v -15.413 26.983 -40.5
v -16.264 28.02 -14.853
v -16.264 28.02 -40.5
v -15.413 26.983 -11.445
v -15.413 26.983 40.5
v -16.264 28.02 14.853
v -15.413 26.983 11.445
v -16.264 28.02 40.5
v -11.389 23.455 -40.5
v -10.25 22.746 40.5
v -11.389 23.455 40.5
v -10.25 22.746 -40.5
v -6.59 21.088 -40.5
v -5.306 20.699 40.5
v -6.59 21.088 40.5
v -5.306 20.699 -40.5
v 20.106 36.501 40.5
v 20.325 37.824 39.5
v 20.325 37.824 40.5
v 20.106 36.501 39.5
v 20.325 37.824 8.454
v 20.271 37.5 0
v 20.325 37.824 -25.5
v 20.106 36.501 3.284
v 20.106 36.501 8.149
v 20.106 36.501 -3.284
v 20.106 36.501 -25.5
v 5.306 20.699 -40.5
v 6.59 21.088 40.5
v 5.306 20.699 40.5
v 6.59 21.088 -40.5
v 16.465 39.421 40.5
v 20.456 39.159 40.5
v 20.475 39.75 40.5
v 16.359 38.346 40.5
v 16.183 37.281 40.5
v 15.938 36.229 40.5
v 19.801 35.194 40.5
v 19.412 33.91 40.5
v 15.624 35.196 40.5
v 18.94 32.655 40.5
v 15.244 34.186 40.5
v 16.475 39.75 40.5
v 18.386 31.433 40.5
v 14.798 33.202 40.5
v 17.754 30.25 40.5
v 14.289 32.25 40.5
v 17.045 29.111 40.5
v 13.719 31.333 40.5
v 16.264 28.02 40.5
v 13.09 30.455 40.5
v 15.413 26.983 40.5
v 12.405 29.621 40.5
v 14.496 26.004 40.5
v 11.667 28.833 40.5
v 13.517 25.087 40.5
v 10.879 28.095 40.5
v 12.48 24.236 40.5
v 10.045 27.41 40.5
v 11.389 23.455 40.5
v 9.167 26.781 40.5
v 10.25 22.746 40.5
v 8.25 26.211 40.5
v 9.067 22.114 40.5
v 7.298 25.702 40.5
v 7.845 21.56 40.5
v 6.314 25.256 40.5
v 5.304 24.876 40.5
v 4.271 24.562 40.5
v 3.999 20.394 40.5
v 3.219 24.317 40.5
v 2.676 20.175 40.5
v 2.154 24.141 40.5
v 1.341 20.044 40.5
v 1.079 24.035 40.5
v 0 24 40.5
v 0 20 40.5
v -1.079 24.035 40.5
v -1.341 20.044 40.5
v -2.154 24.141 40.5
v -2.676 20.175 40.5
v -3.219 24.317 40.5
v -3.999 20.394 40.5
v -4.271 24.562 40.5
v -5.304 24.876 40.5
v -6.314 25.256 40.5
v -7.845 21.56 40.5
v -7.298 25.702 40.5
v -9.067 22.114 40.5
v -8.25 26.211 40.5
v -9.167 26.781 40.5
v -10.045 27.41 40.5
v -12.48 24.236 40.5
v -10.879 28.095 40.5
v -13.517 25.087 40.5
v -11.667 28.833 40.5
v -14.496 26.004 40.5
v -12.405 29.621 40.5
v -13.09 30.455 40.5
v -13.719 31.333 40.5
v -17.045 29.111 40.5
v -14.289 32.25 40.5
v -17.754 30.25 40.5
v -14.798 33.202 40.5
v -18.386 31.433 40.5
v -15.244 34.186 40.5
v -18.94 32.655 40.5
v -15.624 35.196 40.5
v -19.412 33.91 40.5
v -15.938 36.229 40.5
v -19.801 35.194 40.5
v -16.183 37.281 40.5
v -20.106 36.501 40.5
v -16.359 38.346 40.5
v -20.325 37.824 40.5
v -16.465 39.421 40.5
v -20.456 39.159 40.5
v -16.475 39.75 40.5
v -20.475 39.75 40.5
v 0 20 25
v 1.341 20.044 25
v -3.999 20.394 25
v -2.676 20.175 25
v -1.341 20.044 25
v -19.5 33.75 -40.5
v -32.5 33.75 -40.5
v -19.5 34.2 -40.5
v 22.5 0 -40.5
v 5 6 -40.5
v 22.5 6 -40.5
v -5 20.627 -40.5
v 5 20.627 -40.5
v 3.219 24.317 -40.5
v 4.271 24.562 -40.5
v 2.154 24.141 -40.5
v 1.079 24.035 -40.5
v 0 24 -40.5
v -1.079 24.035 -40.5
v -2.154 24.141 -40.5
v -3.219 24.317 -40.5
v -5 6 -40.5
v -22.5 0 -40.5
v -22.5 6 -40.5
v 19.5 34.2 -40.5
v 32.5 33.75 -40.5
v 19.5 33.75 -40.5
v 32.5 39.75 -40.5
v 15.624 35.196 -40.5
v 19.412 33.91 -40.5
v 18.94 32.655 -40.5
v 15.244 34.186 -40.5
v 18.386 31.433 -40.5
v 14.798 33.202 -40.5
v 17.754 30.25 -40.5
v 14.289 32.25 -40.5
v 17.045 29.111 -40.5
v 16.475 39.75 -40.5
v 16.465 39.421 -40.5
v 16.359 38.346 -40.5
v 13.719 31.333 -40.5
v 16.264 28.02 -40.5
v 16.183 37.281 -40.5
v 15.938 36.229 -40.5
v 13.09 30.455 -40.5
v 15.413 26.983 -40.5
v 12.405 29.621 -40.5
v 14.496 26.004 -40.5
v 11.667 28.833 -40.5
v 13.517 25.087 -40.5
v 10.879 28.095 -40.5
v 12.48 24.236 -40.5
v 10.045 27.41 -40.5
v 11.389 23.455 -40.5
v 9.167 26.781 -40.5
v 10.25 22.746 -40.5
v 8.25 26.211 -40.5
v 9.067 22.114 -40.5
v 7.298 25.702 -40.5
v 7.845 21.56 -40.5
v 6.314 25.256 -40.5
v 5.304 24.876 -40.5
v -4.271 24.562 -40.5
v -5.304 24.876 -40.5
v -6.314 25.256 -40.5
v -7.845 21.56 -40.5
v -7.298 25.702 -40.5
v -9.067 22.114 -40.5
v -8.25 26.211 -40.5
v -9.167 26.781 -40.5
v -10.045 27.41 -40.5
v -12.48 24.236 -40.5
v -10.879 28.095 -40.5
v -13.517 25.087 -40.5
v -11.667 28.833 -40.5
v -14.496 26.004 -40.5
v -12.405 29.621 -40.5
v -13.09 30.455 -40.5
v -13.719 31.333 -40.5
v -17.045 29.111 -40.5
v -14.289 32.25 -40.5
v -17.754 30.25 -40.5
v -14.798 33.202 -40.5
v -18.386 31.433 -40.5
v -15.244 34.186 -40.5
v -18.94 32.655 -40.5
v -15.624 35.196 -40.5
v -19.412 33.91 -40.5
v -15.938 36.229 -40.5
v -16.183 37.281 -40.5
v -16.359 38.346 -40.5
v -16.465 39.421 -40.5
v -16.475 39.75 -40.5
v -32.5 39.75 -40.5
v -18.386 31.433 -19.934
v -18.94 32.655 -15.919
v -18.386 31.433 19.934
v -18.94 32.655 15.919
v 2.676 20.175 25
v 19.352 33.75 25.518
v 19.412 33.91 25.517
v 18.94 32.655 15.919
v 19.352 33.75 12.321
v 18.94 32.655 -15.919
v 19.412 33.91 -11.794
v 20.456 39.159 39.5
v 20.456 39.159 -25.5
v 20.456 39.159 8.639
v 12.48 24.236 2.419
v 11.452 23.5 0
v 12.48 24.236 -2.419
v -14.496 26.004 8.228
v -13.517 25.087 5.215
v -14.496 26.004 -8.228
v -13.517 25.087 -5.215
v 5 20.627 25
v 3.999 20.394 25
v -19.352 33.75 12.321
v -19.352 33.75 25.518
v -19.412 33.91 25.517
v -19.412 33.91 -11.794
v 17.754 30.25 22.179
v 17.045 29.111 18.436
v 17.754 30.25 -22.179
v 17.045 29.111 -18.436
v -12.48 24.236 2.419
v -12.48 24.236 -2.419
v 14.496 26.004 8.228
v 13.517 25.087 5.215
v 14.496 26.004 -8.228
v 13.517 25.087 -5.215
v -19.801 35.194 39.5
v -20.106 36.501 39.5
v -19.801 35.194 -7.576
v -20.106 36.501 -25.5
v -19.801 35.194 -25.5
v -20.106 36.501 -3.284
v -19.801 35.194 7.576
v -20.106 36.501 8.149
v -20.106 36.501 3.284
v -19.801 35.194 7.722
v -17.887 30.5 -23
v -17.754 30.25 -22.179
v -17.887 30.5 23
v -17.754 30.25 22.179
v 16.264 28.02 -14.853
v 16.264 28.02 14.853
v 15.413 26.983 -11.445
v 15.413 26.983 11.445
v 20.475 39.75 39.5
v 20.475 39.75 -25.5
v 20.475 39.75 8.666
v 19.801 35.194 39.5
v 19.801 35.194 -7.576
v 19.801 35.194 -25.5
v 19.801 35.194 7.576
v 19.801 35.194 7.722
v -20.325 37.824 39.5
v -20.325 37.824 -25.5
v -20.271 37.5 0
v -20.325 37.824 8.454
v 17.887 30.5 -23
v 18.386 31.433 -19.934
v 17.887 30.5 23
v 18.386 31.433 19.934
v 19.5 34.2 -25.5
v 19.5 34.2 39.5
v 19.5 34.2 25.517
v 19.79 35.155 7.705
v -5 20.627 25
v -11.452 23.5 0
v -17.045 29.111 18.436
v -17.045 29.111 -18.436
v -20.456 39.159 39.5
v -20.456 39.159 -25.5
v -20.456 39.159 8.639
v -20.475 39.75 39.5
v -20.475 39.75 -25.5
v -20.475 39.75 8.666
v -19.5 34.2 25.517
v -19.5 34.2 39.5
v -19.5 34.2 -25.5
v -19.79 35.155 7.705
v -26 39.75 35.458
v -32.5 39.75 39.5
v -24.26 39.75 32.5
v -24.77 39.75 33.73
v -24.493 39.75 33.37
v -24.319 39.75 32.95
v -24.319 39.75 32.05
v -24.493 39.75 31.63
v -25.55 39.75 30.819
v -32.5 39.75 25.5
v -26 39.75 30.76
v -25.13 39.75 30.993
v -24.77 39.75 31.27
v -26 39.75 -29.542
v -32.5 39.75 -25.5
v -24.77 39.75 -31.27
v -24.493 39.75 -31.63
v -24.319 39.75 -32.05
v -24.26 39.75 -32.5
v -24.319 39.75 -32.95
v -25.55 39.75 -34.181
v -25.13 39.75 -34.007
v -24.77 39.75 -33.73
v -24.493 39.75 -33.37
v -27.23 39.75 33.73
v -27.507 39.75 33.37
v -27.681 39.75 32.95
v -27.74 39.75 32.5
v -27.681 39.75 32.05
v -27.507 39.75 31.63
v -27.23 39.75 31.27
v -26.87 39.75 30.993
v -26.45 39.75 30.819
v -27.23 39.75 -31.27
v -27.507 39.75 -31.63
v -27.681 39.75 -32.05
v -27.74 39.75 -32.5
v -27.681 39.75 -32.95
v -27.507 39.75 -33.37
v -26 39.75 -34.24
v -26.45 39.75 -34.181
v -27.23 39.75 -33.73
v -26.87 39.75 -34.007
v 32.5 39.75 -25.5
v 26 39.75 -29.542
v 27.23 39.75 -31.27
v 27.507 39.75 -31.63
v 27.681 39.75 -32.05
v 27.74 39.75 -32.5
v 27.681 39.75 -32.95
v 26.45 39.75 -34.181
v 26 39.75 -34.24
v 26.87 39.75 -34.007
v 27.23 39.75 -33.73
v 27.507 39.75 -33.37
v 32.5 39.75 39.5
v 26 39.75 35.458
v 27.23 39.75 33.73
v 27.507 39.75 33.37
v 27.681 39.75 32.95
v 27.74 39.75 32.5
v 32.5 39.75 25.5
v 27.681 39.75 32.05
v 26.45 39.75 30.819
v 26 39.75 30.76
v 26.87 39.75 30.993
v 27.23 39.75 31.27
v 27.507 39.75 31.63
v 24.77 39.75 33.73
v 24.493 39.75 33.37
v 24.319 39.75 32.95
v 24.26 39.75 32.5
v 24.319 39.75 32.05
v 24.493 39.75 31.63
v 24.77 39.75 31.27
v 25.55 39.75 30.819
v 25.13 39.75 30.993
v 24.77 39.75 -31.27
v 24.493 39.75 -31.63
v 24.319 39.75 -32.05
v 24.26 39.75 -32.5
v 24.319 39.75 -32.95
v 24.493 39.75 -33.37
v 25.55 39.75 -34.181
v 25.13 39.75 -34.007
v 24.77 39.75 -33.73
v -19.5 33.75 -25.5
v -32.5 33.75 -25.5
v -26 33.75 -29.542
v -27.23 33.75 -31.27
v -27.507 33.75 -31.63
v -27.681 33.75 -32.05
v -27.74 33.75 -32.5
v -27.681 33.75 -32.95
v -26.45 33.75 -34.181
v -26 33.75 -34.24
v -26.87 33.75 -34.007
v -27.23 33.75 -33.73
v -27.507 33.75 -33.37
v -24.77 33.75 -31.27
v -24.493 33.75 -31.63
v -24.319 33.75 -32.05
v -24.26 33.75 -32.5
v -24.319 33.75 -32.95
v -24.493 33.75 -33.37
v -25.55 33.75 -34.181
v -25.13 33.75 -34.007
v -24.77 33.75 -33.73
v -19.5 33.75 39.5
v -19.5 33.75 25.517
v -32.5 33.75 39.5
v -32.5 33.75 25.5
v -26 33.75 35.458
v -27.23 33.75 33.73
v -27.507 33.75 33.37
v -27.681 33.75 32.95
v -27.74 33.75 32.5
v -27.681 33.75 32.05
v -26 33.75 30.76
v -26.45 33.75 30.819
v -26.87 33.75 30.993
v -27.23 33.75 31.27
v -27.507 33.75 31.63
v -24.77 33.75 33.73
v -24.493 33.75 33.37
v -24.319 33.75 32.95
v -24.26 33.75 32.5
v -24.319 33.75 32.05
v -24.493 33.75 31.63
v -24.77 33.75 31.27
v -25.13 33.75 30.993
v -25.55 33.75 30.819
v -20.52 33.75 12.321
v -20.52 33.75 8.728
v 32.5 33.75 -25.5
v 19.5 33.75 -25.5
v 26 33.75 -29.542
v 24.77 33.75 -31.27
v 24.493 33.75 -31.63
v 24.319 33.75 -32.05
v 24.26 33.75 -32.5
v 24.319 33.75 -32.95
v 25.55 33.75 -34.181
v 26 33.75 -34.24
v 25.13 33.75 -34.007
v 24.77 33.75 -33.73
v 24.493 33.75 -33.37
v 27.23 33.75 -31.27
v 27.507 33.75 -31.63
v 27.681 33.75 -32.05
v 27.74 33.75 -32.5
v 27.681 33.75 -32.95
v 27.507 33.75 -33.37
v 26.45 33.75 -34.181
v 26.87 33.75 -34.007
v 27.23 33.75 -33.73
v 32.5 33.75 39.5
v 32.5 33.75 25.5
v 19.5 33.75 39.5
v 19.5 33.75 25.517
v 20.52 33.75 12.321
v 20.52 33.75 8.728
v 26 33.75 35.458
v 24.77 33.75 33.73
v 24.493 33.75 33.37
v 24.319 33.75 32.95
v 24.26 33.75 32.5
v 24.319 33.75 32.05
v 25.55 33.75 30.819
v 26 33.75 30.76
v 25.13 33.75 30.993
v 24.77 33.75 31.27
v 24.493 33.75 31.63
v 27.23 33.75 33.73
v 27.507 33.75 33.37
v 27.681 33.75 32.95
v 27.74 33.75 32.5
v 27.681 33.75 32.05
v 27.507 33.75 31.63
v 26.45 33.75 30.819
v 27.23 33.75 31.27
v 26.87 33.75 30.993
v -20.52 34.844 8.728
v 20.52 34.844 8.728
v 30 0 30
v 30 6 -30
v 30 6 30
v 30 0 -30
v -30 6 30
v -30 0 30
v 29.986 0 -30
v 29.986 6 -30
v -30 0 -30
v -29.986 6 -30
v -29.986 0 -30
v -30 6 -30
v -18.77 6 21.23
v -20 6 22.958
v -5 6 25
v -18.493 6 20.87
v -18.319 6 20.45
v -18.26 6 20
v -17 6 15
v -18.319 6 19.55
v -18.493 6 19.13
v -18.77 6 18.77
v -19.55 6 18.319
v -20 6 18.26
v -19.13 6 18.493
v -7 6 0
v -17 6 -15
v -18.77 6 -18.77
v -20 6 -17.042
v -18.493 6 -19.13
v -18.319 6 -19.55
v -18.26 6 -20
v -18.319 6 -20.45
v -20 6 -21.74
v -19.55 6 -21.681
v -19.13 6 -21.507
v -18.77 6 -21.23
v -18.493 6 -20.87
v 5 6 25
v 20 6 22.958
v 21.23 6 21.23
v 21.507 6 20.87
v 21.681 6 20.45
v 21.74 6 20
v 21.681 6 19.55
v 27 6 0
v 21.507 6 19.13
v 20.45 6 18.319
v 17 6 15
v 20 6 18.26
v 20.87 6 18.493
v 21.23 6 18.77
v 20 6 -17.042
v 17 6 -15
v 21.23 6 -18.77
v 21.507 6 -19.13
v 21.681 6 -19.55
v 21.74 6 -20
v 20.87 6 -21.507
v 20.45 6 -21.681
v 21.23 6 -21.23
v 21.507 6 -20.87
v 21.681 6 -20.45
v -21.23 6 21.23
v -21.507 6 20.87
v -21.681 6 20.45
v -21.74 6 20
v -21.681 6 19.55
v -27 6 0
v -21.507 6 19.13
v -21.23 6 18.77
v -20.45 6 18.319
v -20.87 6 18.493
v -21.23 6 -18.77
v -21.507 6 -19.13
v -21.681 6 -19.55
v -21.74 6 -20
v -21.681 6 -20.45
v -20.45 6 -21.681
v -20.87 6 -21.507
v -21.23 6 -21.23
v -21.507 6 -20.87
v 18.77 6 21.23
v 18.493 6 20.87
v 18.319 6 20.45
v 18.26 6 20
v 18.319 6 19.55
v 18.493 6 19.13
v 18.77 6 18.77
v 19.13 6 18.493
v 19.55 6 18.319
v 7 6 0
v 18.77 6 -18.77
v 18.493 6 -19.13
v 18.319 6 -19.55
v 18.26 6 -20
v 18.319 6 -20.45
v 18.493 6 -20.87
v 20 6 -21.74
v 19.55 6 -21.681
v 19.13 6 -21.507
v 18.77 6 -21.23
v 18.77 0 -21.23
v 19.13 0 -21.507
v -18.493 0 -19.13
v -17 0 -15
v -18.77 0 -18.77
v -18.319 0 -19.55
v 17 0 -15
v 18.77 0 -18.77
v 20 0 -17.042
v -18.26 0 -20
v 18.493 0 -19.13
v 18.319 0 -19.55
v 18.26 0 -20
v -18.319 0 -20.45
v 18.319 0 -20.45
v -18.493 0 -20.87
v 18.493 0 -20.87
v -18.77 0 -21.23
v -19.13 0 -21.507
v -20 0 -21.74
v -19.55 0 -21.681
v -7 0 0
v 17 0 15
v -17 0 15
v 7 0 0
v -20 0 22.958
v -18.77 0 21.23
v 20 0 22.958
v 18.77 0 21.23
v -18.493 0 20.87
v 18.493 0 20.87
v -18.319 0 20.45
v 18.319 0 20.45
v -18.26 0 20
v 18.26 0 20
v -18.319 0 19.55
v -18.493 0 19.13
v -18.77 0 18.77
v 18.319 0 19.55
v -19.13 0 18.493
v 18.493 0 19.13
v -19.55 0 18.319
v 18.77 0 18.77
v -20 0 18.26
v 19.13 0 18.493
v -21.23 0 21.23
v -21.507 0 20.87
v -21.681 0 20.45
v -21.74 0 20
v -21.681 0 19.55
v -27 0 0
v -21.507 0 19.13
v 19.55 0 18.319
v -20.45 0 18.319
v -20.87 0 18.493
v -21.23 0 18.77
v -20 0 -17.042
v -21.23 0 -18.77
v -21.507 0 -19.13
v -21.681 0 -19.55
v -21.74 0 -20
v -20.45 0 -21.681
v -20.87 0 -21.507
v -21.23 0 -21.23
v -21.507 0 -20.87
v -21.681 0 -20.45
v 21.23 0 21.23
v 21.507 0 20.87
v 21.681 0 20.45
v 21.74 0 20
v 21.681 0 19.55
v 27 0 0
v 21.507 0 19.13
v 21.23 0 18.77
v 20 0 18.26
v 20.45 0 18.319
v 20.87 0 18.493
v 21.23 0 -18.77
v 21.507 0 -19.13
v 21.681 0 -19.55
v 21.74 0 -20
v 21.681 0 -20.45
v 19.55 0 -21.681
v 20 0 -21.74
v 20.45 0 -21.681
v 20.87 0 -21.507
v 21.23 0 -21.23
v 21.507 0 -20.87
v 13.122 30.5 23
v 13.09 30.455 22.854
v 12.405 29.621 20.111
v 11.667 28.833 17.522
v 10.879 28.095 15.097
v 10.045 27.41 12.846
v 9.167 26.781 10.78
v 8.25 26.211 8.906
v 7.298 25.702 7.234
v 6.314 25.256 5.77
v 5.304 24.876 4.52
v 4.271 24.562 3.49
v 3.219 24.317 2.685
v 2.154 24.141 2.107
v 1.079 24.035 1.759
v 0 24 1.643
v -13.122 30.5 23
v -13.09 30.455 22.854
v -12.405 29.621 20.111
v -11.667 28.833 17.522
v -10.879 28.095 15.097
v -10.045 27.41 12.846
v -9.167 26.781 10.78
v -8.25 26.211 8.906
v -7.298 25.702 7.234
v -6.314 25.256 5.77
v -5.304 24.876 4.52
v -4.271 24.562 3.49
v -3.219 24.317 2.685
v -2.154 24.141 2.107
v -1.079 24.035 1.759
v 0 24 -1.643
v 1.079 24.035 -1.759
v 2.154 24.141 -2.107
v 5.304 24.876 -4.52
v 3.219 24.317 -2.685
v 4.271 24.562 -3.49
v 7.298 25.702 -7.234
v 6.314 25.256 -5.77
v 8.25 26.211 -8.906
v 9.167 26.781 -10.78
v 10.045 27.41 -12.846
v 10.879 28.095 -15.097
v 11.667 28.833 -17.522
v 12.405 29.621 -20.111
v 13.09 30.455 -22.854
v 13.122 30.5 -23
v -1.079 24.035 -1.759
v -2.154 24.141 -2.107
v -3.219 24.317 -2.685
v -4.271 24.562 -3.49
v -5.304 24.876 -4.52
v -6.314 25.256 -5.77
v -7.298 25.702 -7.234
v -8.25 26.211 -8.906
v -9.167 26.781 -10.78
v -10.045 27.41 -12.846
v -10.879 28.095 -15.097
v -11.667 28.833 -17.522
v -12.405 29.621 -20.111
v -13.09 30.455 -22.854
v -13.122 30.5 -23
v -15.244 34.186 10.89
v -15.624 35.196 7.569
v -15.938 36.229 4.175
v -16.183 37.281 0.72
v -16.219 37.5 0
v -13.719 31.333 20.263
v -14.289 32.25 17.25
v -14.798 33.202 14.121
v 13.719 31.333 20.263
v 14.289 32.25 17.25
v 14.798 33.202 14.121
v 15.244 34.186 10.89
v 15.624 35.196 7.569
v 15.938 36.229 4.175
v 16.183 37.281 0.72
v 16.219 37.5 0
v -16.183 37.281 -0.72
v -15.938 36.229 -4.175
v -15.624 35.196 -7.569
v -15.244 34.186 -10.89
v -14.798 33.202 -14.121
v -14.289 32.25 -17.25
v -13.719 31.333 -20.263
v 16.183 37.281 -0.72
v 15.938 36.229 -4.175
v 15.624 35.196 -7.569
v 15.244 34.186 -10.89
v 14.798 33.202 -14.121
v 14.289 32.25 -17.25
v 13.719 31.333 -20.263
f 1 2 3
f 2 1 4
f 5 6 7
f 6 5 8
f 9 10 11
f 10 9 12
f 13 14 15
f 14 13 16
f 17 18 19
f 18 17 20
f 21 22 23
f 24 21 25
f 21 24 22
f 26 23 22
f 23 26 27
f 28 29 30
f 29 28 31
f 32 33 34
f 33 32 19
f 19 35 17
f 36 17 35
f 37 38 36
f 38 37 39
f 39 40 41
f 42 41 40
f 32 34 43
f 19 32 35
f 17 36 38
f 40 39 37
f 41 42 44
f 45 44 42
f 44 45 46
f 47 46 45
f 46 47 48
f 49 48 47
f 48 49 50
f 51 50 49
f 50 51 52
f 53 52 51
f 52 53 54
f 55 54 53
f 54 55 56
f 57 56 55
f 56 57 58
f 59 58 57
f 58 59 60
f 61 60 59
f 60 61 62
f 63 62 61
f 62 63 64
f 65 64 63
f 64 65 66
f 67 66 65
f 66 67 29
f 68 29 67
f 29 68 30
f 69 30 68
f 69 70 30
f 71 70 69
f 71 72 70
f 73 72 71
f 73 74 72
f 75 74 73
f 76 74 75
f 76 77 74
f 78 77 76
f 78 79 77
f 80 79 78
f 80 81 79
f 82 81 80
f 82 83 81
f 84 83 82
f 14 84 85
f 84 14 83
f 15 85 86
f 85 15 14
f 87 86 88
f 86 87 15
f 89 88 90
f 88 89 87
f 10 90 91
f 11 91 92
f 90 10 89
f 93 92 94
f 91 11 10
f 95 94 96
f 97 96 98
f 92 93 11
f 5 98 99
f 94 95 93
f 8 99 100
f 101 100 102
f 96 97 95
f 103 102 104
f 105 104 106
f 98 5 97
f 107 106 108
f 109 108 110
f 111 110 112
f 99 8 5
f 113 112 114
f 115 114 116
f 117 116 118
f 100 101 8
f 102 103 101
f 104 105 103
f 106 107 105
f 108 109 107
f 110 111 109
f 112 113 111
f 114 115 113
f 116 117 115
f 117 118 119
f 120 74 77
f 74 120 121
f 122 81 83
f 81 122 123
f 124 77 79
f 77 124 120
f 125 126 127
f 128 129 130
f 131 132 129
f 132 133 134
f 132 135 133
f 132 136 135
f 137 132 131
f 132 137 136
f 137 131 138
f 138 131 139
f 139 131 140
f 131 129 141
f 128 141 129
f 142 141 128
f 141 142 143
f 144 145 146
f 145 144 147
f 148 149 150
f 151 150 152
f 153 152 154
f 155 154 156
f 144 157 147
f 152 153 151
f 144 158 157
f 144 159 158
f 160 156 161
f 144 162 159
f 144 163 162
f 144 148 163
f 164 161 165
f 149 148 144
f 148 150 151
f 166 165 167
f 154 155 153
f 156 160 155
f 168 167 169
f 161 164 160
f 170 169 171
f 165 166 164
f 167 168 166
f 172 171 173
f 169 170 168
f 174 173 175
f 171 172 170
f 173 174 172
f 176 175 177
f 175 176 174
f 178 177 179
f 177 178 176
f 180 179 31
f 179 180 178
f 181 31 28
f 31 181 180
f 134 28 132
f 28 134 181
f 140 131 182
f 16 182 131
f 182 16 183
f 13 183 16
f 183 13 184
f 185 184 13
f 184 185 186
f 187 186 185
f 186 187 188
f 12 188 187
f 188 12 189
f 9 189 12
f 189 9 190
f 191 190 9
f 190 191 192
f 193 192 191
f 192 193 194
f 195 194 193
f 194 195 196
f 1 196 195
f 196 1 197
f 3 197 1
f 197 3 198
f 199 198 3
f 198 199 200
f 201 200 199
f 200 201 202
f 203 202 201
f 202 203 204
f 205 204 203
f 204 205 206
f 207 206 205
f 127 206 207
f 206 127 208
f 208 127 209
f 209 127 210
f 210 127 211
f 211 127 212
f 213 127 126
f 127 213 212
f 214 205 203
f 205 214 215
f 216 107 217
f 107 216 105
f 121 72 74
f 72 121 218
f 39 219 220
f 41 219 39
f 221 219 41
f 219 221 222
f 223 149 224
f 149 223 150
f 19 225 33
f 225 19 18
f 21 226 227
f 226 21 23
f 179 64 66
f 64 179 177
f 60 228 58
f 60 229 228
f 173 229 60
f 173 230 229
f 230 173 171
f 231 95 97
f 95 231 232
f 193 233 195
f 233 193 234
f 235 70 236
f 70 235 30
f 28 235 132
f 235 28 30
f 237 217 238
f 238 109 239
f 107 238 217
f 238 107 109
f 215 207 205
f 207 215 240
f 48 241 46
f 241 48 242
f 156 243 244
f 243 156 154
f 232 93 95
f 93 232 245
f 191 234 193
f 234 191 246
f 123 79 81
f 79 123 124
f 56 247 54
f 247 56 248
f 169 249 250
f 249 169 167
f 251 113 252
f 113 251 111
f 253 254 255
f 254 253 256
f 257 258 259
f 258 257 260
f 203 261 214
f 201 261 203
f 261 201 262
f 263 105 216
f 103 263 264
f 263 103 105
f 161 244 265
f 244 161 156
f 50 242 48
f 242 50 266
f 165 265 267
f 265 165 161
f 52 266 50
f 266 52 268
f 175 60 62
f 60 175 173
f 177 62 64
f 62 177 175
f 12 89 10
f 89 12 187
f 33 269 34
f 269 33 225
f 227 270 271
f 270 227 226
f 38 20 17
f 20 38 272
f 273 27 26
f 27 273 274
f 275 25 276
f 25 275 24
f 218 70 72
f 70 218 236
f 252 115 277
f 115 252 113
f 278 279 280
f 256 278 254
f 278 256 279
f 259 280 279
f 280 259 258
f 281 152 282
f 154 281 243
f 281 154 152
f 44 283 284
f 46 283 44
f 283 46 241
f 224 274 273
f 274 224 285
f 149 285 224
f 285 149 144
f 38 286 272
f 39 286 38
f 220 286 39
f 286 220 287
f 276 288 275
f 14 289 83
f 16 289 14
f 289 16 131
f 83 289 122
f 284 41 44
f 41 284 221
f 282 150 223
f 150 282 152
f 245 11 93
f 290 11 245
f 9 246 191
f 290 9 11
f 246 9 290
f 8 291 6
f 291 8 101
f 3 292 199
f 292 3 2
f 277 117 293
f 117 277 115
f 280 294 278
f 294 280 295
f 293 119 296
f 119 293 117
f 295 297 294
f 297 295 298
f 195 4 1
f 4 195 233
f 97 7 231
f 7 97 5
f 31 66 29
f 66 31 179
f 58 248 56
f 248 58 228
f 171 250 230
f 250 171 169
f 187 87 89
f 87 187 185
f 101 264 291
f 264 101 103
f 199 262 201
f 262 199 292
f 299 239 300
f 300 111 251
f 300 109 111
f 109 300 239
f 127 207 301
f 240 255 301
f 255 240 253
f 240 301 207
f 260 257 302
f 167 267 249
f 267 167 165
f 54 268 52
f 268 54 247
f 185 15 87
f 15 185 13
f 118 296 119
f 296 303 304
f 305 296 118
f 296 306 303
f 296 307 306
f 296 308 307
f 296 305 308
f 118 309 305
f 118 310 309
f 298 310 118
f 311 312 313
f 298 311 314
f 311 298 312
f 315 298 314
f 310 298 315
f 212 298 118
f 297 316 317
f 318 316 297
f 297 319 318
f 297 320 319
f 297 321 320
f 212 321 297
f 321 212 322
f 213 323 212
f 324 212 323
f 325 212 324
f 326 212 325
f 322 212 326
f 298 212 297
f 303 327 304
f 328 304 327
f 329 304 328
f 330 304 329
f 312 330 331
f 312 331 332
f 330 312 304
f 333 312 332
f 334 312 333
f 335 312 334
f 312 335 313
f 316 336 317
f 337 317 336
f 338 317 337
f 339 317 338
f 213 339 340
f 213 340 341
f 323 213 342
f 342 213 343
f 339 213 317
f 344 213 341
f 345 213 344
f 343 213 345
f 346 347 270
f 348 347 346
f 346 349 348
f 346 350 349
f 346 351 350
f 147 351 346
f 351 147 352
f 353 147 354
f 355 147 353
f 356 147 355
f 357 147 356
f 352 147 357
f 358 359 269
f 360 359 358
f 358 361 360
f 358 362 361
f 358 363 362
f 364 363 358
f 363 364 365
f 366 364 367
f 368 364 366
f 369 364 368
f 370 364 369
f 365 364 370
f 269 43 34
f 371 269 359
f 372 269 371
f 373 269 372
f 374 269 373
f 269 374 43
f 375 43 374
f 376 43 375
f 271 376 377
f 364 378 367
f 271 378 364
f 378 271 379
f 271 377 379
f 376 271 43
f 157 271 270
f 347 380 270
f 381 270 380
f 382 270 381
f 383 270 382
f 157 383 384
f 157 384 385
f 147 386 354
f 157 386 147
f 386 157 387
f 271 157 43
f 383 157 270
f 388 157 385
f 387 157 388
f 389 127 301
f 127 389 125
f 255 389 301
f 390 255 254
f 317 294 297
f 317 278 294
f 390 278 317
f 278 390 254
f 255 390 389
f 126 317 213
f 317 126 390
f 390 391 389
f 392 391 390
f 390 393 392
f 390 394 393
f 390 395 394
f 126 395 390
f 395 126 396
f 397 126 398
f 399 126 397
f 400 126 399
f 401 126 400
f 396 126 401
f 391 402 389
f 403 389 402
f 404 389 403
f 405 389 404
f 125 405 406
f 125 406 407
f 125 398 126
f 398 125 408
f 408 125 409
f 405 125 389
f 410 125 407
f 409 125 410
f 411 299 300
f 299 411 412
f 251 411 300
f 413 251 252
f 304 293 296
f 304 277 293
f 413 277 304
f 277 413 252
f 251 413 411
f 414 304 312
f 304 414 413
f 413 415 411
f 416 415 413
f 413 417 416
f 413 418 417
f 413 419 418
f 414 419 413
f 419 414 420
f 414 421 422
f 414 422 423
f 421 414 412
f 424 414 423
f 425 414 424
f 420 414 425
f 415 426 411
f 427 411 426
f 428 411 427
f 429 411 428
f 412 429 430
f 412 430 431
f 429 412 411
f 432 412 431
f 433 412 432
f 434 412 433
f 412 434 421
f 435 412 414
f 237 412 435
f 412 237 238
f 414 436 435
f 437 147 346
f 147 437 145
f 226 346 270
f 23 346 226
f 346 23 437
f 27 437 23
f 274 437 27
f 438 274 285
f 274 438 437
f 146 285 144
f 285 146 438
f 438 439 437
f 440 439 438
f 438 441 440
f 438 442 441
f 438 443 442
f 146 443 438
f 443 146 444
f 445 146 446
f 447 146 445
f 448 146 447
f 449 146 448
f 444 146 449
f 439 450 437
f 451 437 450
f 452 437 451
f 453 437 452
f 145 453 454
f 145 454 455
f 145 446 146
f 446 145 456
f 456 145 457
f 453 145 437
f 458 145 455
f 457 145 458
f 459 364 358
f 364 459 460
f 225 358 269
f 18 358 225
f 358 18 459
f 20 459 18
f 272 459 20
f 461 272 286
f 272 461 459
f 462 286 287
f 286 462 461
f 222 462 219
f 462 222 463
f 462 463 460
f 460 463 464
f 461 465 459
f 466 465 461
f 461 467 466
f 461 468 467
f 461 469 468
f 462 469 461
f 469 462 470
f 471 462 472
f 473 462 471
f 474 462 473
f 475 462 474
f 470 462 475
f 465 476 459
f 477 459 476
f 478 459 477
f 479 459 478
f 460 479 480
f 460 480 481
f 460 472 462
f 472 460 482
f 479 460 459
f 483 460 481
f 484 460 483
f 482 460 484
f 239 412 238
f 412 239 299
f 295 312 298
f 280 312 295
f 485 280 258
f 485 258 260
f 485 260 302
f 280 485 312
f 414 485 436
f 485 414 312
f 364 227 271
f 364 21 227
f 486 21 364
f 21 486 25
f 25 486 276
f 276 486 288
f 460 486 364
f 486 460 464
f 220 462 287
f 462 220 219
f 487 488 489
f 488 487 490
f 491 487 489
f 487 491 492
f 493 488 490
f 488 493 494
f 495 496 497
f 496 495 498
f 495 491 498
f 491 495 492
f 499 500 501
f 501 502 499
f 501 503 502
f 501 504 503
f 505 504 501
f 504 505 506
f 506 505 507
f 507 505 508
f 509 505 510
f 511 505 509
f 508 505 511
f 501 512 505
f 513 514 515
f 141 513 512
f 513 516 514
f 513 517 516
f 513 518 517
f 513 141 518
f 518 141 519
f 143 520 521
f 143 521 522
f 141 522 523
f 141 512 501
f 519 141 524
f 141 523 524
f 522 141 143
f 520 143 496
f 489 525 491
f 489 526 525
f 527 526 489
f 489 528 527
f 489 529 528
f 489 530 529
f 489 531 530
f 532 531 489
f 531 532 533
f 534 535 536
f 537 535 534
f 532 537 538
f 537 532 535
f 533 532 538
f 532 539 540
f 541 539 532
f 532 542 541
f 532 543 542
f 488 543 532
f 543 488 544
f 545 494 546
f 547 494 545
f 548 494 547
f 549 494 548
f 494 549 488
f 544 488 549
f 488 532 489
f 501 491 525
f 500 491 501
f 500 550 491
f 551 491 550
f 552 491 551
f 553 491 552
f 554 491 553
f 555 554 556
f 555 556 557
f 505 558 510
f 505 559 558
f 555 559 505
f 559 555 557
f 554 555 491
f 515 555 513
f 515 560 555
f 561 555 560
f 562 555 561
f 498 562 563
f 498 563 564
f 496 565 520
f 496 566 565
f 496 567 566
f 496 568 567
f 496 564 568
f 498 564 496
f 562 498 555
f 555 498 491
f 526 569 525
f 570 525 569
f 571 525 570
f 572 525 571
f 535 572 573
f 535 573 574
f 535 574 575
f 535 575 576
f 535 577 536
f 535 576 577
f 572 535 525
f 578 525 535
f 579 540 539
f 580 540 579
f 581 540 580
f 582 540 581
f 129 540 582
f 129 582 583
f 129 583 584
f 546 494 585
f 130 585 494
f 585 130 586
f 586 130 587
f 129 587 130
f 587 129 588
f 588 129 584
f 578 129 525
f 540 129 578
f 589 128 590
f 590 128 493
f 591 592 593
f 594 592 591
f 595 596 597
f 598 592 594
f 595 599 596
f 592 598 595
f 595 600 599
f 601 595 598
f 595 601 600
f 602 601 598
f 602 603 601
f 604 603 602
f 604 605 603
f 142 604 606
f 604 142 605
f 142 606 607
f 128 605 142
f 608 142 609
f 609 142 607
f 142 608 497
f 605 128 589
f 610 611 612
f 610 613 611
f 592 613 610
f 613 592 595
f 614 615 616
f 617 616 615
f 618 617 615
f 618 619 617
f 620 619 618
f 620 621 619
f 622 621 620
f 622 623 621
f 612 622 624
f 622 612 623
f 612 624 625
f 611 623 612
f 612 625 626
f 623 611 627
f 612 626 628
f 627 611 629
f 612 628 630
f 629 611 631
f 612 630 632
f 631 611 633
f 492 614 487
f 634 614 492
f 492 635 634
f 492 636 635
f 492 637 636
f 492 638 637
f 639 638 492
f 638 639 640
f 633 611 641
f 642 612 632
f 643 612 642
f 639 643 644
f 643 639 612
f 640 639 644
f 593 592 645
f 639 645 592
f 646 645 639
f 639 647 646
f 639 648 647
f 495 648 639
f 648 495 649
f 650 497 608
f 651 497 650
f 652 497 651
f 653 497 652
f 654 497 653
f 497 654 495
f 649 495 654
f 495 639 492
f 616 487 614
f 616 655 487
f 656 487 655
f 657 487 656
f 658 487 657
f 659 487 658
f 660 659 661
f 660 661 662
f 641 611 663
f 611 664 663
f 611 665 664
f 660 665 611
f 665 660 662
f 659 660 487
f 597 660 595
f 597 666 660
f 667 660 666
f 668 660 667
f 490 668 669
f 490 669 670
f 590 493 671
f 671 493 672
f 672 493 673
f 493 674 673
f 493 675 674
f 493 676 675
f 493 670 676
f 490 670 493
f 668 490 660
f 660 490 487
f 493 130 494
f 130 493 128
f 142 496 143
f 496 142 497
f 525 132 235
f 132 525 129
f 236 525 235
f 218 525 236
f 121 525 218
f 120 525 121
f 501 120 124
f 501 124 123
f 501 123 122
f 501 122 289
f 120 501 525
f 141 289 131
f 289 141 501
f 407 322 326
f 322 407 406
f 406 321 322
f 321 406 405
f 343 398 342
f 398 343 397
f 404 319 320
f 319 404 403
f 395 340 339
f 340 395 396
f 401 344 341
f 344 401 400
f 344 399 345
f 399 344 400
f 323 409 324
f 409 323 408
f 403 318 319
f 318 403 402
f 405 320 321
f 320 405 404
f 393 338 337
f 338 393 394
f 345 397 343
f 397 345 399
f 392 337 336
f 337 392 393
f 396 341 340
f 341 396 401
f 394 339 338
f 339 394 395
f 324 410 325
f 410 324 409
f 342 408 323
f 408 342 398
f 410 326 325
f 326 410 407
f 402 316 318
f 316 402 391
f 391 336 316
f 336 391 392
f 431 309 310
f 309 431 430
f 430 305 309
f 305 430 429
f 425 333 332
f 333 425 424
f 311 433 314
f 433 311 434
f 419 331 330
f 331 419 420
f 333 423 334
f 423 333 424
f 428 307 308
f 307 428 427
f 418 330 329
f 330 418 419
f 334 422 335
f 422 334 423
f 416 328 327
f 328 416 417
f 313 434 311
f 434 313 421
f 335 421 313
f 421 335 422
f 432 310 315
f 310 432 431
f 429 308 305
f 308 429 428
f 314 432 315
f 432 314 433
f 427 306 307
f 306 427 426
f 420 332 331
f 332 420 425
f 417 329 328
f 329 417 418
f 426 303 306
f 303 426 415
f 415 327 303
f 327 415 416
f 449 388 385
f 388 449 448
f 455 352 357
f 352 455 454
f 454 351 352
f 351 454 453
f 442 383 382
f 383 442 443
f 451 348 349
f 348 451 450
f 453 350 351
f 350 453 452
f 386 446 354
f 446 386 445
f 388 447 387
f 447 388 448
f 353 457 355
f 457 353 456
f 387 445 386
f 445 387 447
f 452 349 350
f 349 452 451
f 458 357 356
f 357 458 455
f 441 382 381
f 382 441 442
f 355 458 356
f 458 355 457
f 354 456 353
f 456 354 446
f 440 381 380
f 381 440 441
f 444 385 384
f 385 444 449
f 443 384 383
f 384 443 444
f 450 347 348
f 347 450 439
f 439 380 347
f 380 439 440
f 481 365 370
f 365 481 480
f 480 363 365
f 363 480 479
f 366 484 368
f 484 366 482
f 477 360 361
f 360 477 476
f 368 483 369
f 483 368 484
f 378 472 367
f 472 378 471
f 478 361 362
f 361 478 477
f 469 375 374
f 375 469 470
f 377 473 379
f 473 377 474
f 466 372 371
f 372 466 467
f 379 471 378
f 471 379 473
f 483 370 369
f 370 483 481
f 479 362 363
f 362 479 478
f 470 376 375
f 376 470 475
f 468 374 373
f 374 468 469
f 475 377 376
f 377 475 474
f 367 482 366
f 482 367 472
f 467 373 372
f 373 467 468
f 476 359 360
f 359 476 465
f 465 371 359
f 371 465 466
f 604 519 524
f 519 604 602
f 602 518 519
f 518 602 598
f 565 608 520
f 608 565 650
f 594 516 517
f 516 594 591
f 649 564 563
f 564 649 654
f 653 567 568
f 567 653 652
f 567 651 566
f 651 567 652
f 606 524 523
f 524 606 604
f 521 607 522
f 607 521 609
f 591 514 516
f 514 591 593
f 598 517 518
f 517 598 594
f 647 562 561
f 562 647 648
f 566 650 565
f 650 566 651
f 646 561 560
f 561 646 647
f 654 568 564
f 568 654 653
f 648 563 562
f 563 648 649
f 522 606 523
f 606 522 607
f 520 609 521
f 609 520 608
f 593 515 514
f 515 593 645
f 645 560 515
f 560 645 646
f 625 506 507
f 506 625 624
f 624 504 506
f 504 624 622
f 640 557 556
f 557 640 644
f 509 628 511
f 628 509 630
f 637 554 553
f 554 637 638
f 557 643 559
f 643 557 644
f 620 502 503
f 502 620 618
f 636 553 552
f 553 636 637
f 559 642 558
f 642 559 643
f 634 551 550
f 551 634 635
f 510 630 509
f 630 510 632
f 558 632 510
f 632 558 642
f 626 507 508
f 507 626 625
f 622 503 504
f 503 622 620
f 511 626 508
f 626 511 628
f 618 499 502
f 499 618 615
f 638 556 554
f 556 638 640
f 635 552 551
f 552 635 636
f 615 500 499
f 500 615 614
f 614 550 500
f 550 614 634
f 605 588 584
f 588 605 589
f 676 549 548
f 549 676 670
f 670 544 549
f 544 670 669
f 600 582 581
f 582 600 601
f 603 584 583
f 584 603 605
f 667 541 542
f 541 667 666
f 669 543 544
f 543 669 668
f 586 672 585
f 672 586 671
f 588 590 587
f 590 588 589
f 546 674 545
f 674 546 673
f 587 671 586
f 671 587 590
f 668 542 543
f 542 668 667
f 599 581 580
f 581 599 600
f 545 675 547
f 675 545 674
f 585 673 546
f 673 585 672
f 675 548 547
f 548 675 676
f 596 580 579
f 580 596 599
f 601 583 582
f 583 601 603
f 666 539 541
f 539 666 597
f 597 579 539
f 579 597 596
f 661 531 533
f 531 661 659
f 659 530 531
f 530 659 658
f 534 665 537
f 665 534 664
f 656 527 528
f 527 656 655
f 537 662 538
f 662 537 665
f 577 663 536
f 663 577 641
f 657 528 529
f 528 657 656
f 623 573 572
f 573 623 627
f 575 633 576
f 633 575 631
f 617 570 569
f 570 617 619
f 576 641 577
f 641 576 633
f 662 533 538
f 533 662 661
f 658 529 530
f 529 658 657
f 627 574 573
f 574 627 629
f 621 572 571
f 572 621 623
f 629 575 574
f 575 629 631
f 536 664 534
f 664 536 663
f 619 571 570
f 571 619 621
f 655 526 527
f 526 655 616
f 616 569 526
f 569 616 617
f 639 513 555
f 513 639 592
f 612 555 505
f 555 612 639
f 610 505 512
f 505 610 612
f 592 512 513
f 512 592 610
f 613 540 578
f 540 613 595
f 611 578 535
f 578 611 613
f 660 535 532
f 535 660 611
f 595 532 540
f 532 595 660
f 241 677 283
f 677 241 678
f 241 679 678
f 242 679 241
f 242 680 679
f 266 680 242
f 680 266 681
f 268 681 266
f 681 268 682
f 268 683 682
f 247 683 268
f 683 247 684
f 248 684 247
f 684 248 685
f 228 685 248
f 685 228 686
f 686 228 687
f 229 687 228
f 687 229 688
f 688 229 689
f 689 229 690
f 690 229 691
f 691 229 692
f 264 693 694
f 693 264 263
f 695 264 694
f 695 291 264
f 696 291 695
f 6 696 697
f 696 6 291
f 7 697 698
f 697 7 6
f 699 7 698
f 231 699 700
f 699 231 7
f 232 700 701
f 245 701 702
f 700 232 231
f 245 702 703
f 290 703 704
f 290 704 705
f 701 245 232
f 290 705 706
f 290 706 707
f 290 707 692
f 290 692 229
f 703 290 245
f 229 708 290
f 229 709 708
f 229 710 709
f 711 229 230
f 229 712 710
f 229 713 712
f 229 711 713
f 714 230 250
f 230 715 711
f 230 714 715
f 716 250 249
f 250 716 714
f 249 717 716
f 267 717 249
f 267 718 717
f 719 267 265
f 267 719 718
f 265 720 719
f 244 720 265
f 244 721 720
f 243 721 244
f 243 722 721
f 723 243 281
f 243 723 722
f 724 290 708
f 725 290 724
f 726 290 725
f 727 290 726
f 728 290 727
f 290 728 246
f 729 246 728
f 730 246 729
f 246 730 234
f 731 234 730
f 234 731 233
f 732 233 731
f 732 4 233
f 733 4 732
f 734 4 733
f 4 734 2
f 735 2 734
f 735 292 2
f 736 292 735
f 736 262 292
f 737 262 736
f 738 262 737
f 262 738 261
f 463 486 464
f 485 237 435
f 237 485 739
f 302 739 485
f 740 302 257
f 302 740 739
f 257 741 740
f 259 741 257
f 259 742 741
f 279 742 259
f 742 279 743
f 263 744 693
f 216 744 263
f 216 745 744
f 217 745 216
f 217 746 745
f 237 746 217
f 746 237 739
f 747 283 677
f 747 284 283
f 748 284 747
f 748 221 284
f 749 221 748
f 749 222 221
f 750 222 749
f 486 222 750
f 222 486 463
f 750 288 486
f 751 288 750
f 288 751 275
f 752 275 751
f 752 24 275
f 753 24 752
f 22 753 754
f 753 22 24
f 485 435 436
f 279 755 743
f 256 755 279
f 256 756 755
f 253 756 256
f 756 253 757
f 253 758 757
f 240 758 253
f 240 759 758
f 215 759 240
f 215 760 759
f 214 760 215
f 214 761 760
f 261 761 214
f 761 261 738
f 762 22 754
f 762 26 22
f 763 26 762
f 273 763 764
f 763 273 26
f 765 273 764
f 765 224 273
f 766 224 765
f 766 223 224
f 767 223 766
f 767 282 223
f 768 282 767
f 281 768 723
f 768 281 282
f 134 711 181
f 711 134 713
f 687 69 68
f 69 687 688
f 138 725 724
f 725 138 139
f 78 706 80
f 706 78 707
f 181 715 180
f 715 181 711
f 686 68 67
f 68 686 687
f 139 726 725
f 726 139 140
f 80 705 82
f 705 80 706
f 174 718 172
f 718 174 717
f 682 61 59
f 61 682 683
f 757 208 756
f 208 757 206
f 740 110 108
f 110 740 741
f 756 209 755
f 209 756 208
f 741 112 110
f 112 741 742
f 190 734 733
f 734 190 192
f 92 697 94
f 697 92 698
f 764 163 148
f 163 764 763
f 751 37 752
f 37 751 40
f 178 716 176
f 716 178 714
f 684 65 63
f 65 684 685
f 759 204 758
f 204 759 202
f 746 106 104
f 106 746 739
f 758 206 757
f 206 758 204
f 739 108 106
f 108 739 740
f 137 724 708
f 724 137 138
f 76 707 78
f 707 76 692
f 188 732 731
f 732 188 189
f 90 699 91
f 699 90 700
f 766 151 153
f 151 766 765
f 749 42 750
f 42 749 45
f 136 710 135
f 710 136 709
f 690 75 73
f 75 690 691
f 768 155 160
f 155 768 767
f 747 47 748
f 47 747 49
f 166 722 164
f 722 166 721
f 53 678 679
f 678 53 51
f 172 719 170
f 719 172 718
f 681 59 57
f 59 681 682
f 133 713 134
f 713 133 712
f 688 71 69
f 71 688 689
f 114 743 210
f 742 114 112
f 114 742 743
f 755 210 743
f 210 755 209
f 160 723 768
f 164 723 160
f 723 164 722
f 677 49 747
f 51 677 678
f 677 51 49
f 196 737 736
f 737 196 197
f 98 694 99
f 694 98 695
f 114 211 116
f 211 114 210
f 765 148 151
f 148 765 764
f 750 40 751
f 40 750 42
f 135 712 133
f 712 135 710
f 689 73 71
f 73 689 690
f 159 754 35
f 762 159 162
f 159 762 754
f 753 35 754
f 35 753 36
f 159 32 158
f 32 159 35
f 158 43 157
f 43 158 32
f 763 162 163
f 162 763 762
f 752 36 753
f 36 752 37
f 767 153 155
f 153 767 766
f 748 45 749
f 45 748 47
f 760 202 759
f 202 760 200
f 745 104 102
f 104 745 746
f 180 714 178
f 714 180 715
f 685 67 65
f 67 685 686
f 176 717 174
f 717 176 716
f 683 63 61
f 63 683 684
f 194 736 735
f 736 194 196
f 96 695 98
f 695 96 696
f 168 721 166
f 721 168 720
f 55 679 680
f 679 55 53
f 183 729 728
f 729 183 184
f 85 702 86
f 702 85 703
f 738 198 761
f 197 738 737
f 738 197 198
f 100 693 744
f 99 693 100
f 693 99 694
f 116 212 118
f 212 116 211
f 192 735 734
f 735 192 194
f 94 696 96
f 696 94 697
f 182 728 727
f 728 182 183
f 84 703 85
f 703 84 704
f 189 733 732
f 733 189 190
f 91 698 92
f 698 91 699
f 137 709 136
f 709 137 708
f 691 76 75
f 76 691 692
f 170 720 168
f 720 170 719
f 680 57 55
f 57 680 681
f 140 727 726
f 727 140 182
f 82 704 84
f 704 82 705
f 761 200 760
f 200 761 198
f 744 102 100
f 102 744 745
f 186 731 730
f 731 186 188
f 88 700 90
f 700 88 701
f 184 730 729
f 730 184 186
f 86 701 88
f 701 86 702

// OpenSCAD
// mm. Local +Y points away from the vehicle; light axis Z.
// Installed: rotate Z 180 deg, then translate [0,-82,100].
include <../../../../../scad/lib/child_simple_frame.scad>

/* [Light holder] */
part = "base"; // [base,cap,assembly]
lm_holder_id = 33; // Reference holder bore, NOT a measured light diameter
lm_holder_length = 81;
lm_wall = 4;
lm_split_gap = 1.5;
lm_plate_t = 6;
lm_service_gap = 14;
lm_spine_width = 10;
lm_spine_height = 50;
lm_ear_width = 13;
lm_ear_height = 14;
lm_ear_t = 6;
lm_ear_end_margin = 1;
lm_clamp_clear_d = 3.45;
print_pose = false;

/* [Support reduction / modest lightening] */
lm_plate_window_w = 20;
lm_plate_window_h = 30;
lm_side_window_w = 14;
lm_side_window_h = 46;
lm_side_window_offset = 10;
lm_ramp_rise = 1.4; // Steeper than 45 degrees for slicer/process margin

/* [Hidden] */
$fn = 96;
lm_e = 0.02;
lm_ro = lm_holder_id/2+lm_wall;
lm_cy = lm_plate_t+lm_service_gap+lm_ro;
lm_ear_x = lm_ro+lm_ear_width/2-1;
lm_ear_z = lm_holder_length/2-lm_ear_height/2-lm_ear_end_margin;
lm_mount_features = [for(x=[-mount_pitch/2,mount_pitch/2],z=[-mount_pitch/2,mount_pitch/2]) [x,z,5]];
assert(lm_holder_id>0 && lm_wall>=3 && lm_split_gap>0 && lm_split_gap<lm_wall);
assert(lm_spine_width/2+5 < mount_pitch/2,"Mount tool/spine collision");
assert(lm_service_gap>=12,"L-key access gap");
assert(lm_ear_width/2>lm_clamp_clear_d/2+3);
assert(lm_ear_height/2>lm_clamp_clear_d/2+3);
for(a=lm_mount_features) {
    assert(abs(a[0])+a[2] < mount_width/2);
    assert(abs(a[1])+a[2] < mount_height/2);
    for(b=lm_mount_features) if(a!=b)
        assert(norm([a[0]-b[0],a[1]-b[1]])>a[2]+b[2]);
}
module bore_y(x,y,z,d,h) {
    translate([x,y,z]) rotate([-90,0,0]) cylinder(d=d/cos(180/24),h=h,$fn=24);
    // Peaked roof steeper than 45 degrees; full M3 circle remains clear.
    r=d/2/cos(180/24);
    translate([x,0,z]) prism_y([[-r/sqrt(2),r/sqrt(2)],[r/sqrt(2),r/sqrt(2)],[0,r*1.7]],y,h);
}
module prism_y(points,y,h) {
    translate([0,y+h,0]) rotate([90,0,0]) linear_extrude(h) polygon(points);
}
module diamond_y(x,z,w,h,y,depth) {
    translate([x,0,z]) prism_y([[-w/2,0],[0,-h/2],[w/2,0],[0,h/2]],y,depth);
}
assert(lm_plate_window_h>=lm_plate_window_w && lm_side_window_h>=lm_side_window_w,"Window roof must be at least 45 degrees");
assert(17-lm_plate_window_w/2>lm_spine_width/2,"Keep central spine");
assert(lm_side_window_h/2<lm_ear_z-lm_ear_height/2,"Keep clamp bands");
module sleeve() {
    translate([0,lm_cy,-lm_holder_length/2]) cylinder(r=lm_ro,h=lm_holder_length);
}
// Integral fixtures reuse the identical shell, ears, bore and clamp locations.
// The legacy plate/spine is optional; existing base/cap branches keep it.
module half_holder(front=false,mount_plate=true) {
    difference() {
        union() {
            intersection() {
                sleeve();
                translate([-lm_ro-lm_e,front?lm_cy+lm_split_gap/2:0,-lm_holder_length/2-lm_e])
                    cube([2*lm_ro+2*lm_e,front?lm_ro+lm_e:lm_cy-lm_split_gap/2,lm_holder_length+2*lm_e]);
            }
            for(x=[-lm_ear_x,lm_ear_x],z=[-lm_ear_z,lm_ear_z])
                translate([x-lm_ear_width/2,front?lm_cy+lm_split_gap/2:lm_cy-lm_split_gap/2-lm_ear_t,z-lm_ear_height/2])
                    cube([lm_ear_width,lm_ear_t,lm_ear_height]);
            for(sign=[-1,1]) {
                // Upper ears grow out of the cylinder at about 54 degrees.
                scale([sign,1,1]) prism_y([
                    [lm_ro-3,lm_ear_z-lm_ear_height/2-lm_ramp_rise*(lm_ear_x+lm_ear_width/2-(lm_ro-3))],
                    [lm_ear_x+lm_ear_width/2,lm_ear_z-lm_ear_height/2],
                    [lm_ro-3,lm_ear_z-lm_ear_height/2+lm_e]],
                    front?lm_cy+lm_split_gap/2:lm_cy-lm_split_gap/2-lm_ear_t,lm_ear_t);
                // Lower ears start on the bed, rather than 1 mm above it.
                translate([sign*lm_ear_x-lm_ear_width/2,front?lm_cy+lm_split_gap/2:lm_cy-lm_split_gap/2-lm_ear_t,-lm_holder_length/2])
                    cube([lm_ear_width,lm_ear_t,lm_ear_end_margin+lm_e]);
            }
            if(!front && mount_plate) {
                translate([-mount_width/2,0,-mount_height/2]) cube([mount_width,lm_plate_t,mount_height]);
                // Foot joins plate, spine and sleeve on the first layer.
                foot_drop=(lm_holder_length-mount_height)/2;
                prism_y([[-mount_width/2+foot_drop/lm_ramp_rise,-lm_holder_length/2],
                         [mount_width/2-foot_drop/lm_ramp_rise,-lm_holder_length/2],
                         [mount_width/2,-mount_height/2+lm_e],[-mount_width/2,-mount_height/2+lm_e]],0,lm_plate_t);
                translate([-lm_spine_width/2,lm_plate_t-lm_e,-lm_holder_length/2])
                    cube([lm_spine_width,lm_cy-lm_plate_t,(lm_holder_length+lm_spine_height)/2]);
            }
        }
        translate([0,lm_cy,-lm_holder_length/2-lm_e]) cylinder(d=lm_holder_id,h=lm_holder_length+2*lm_e);
        for(x=[-lm_ear_x,lm_ear_x],z=[-lm_ear_z,lm_ear_z])
            bore_y(x,lm_cy-lm_ear_t-lm_split_gap,z,lm_clamp_clear_d,2*(lm_ear_t+lm_split_gap));
        if(!front && mount_plate) for(h=lm_mount_features) bore_y(h[0],-lm_e,h[1],m3_clearance_d,lm_plate_t+2*lm_e);
        if(!front && mount_plate) for(x=[-17,17]) diamond_y(x,0,lm_plate_window_w,lm_plate_window_h,-lm_e,lm_plate_t+2*lm_e);
        // Side windows leave the full-diameter upper/lower clamping bands.
        for(y=[-lm_side_window_offset,lm_side_window_offset])
            translate([-lm_ro-lm_e,lm_cy,0]) rotate([90,0,90]) linear_extrude(2*lm_ro+2*lm_e)
                polygon([[y-lm_side_window_w/2,0],[y,-lm_side_window_h/2],[y+lm_side_window_w/2,0],[y,lm_side_window_h/2]]);
    }
}
module selected() {
    if(part=="base") half_holder(false);
    else if(part=="cap") half_holder(true);
    else if(part=="assembly") {
        color("SteelBlue") half_holder(false);
        color("Orange") half_holder(true);
    } else assert(false,"Unknown part");
}
// Axis vertical: uninterrupted sleeve walls, no supports inside the bore.
if(print_pose) translate([0,0,lm_holder_length/2]) selected();
else selected();
